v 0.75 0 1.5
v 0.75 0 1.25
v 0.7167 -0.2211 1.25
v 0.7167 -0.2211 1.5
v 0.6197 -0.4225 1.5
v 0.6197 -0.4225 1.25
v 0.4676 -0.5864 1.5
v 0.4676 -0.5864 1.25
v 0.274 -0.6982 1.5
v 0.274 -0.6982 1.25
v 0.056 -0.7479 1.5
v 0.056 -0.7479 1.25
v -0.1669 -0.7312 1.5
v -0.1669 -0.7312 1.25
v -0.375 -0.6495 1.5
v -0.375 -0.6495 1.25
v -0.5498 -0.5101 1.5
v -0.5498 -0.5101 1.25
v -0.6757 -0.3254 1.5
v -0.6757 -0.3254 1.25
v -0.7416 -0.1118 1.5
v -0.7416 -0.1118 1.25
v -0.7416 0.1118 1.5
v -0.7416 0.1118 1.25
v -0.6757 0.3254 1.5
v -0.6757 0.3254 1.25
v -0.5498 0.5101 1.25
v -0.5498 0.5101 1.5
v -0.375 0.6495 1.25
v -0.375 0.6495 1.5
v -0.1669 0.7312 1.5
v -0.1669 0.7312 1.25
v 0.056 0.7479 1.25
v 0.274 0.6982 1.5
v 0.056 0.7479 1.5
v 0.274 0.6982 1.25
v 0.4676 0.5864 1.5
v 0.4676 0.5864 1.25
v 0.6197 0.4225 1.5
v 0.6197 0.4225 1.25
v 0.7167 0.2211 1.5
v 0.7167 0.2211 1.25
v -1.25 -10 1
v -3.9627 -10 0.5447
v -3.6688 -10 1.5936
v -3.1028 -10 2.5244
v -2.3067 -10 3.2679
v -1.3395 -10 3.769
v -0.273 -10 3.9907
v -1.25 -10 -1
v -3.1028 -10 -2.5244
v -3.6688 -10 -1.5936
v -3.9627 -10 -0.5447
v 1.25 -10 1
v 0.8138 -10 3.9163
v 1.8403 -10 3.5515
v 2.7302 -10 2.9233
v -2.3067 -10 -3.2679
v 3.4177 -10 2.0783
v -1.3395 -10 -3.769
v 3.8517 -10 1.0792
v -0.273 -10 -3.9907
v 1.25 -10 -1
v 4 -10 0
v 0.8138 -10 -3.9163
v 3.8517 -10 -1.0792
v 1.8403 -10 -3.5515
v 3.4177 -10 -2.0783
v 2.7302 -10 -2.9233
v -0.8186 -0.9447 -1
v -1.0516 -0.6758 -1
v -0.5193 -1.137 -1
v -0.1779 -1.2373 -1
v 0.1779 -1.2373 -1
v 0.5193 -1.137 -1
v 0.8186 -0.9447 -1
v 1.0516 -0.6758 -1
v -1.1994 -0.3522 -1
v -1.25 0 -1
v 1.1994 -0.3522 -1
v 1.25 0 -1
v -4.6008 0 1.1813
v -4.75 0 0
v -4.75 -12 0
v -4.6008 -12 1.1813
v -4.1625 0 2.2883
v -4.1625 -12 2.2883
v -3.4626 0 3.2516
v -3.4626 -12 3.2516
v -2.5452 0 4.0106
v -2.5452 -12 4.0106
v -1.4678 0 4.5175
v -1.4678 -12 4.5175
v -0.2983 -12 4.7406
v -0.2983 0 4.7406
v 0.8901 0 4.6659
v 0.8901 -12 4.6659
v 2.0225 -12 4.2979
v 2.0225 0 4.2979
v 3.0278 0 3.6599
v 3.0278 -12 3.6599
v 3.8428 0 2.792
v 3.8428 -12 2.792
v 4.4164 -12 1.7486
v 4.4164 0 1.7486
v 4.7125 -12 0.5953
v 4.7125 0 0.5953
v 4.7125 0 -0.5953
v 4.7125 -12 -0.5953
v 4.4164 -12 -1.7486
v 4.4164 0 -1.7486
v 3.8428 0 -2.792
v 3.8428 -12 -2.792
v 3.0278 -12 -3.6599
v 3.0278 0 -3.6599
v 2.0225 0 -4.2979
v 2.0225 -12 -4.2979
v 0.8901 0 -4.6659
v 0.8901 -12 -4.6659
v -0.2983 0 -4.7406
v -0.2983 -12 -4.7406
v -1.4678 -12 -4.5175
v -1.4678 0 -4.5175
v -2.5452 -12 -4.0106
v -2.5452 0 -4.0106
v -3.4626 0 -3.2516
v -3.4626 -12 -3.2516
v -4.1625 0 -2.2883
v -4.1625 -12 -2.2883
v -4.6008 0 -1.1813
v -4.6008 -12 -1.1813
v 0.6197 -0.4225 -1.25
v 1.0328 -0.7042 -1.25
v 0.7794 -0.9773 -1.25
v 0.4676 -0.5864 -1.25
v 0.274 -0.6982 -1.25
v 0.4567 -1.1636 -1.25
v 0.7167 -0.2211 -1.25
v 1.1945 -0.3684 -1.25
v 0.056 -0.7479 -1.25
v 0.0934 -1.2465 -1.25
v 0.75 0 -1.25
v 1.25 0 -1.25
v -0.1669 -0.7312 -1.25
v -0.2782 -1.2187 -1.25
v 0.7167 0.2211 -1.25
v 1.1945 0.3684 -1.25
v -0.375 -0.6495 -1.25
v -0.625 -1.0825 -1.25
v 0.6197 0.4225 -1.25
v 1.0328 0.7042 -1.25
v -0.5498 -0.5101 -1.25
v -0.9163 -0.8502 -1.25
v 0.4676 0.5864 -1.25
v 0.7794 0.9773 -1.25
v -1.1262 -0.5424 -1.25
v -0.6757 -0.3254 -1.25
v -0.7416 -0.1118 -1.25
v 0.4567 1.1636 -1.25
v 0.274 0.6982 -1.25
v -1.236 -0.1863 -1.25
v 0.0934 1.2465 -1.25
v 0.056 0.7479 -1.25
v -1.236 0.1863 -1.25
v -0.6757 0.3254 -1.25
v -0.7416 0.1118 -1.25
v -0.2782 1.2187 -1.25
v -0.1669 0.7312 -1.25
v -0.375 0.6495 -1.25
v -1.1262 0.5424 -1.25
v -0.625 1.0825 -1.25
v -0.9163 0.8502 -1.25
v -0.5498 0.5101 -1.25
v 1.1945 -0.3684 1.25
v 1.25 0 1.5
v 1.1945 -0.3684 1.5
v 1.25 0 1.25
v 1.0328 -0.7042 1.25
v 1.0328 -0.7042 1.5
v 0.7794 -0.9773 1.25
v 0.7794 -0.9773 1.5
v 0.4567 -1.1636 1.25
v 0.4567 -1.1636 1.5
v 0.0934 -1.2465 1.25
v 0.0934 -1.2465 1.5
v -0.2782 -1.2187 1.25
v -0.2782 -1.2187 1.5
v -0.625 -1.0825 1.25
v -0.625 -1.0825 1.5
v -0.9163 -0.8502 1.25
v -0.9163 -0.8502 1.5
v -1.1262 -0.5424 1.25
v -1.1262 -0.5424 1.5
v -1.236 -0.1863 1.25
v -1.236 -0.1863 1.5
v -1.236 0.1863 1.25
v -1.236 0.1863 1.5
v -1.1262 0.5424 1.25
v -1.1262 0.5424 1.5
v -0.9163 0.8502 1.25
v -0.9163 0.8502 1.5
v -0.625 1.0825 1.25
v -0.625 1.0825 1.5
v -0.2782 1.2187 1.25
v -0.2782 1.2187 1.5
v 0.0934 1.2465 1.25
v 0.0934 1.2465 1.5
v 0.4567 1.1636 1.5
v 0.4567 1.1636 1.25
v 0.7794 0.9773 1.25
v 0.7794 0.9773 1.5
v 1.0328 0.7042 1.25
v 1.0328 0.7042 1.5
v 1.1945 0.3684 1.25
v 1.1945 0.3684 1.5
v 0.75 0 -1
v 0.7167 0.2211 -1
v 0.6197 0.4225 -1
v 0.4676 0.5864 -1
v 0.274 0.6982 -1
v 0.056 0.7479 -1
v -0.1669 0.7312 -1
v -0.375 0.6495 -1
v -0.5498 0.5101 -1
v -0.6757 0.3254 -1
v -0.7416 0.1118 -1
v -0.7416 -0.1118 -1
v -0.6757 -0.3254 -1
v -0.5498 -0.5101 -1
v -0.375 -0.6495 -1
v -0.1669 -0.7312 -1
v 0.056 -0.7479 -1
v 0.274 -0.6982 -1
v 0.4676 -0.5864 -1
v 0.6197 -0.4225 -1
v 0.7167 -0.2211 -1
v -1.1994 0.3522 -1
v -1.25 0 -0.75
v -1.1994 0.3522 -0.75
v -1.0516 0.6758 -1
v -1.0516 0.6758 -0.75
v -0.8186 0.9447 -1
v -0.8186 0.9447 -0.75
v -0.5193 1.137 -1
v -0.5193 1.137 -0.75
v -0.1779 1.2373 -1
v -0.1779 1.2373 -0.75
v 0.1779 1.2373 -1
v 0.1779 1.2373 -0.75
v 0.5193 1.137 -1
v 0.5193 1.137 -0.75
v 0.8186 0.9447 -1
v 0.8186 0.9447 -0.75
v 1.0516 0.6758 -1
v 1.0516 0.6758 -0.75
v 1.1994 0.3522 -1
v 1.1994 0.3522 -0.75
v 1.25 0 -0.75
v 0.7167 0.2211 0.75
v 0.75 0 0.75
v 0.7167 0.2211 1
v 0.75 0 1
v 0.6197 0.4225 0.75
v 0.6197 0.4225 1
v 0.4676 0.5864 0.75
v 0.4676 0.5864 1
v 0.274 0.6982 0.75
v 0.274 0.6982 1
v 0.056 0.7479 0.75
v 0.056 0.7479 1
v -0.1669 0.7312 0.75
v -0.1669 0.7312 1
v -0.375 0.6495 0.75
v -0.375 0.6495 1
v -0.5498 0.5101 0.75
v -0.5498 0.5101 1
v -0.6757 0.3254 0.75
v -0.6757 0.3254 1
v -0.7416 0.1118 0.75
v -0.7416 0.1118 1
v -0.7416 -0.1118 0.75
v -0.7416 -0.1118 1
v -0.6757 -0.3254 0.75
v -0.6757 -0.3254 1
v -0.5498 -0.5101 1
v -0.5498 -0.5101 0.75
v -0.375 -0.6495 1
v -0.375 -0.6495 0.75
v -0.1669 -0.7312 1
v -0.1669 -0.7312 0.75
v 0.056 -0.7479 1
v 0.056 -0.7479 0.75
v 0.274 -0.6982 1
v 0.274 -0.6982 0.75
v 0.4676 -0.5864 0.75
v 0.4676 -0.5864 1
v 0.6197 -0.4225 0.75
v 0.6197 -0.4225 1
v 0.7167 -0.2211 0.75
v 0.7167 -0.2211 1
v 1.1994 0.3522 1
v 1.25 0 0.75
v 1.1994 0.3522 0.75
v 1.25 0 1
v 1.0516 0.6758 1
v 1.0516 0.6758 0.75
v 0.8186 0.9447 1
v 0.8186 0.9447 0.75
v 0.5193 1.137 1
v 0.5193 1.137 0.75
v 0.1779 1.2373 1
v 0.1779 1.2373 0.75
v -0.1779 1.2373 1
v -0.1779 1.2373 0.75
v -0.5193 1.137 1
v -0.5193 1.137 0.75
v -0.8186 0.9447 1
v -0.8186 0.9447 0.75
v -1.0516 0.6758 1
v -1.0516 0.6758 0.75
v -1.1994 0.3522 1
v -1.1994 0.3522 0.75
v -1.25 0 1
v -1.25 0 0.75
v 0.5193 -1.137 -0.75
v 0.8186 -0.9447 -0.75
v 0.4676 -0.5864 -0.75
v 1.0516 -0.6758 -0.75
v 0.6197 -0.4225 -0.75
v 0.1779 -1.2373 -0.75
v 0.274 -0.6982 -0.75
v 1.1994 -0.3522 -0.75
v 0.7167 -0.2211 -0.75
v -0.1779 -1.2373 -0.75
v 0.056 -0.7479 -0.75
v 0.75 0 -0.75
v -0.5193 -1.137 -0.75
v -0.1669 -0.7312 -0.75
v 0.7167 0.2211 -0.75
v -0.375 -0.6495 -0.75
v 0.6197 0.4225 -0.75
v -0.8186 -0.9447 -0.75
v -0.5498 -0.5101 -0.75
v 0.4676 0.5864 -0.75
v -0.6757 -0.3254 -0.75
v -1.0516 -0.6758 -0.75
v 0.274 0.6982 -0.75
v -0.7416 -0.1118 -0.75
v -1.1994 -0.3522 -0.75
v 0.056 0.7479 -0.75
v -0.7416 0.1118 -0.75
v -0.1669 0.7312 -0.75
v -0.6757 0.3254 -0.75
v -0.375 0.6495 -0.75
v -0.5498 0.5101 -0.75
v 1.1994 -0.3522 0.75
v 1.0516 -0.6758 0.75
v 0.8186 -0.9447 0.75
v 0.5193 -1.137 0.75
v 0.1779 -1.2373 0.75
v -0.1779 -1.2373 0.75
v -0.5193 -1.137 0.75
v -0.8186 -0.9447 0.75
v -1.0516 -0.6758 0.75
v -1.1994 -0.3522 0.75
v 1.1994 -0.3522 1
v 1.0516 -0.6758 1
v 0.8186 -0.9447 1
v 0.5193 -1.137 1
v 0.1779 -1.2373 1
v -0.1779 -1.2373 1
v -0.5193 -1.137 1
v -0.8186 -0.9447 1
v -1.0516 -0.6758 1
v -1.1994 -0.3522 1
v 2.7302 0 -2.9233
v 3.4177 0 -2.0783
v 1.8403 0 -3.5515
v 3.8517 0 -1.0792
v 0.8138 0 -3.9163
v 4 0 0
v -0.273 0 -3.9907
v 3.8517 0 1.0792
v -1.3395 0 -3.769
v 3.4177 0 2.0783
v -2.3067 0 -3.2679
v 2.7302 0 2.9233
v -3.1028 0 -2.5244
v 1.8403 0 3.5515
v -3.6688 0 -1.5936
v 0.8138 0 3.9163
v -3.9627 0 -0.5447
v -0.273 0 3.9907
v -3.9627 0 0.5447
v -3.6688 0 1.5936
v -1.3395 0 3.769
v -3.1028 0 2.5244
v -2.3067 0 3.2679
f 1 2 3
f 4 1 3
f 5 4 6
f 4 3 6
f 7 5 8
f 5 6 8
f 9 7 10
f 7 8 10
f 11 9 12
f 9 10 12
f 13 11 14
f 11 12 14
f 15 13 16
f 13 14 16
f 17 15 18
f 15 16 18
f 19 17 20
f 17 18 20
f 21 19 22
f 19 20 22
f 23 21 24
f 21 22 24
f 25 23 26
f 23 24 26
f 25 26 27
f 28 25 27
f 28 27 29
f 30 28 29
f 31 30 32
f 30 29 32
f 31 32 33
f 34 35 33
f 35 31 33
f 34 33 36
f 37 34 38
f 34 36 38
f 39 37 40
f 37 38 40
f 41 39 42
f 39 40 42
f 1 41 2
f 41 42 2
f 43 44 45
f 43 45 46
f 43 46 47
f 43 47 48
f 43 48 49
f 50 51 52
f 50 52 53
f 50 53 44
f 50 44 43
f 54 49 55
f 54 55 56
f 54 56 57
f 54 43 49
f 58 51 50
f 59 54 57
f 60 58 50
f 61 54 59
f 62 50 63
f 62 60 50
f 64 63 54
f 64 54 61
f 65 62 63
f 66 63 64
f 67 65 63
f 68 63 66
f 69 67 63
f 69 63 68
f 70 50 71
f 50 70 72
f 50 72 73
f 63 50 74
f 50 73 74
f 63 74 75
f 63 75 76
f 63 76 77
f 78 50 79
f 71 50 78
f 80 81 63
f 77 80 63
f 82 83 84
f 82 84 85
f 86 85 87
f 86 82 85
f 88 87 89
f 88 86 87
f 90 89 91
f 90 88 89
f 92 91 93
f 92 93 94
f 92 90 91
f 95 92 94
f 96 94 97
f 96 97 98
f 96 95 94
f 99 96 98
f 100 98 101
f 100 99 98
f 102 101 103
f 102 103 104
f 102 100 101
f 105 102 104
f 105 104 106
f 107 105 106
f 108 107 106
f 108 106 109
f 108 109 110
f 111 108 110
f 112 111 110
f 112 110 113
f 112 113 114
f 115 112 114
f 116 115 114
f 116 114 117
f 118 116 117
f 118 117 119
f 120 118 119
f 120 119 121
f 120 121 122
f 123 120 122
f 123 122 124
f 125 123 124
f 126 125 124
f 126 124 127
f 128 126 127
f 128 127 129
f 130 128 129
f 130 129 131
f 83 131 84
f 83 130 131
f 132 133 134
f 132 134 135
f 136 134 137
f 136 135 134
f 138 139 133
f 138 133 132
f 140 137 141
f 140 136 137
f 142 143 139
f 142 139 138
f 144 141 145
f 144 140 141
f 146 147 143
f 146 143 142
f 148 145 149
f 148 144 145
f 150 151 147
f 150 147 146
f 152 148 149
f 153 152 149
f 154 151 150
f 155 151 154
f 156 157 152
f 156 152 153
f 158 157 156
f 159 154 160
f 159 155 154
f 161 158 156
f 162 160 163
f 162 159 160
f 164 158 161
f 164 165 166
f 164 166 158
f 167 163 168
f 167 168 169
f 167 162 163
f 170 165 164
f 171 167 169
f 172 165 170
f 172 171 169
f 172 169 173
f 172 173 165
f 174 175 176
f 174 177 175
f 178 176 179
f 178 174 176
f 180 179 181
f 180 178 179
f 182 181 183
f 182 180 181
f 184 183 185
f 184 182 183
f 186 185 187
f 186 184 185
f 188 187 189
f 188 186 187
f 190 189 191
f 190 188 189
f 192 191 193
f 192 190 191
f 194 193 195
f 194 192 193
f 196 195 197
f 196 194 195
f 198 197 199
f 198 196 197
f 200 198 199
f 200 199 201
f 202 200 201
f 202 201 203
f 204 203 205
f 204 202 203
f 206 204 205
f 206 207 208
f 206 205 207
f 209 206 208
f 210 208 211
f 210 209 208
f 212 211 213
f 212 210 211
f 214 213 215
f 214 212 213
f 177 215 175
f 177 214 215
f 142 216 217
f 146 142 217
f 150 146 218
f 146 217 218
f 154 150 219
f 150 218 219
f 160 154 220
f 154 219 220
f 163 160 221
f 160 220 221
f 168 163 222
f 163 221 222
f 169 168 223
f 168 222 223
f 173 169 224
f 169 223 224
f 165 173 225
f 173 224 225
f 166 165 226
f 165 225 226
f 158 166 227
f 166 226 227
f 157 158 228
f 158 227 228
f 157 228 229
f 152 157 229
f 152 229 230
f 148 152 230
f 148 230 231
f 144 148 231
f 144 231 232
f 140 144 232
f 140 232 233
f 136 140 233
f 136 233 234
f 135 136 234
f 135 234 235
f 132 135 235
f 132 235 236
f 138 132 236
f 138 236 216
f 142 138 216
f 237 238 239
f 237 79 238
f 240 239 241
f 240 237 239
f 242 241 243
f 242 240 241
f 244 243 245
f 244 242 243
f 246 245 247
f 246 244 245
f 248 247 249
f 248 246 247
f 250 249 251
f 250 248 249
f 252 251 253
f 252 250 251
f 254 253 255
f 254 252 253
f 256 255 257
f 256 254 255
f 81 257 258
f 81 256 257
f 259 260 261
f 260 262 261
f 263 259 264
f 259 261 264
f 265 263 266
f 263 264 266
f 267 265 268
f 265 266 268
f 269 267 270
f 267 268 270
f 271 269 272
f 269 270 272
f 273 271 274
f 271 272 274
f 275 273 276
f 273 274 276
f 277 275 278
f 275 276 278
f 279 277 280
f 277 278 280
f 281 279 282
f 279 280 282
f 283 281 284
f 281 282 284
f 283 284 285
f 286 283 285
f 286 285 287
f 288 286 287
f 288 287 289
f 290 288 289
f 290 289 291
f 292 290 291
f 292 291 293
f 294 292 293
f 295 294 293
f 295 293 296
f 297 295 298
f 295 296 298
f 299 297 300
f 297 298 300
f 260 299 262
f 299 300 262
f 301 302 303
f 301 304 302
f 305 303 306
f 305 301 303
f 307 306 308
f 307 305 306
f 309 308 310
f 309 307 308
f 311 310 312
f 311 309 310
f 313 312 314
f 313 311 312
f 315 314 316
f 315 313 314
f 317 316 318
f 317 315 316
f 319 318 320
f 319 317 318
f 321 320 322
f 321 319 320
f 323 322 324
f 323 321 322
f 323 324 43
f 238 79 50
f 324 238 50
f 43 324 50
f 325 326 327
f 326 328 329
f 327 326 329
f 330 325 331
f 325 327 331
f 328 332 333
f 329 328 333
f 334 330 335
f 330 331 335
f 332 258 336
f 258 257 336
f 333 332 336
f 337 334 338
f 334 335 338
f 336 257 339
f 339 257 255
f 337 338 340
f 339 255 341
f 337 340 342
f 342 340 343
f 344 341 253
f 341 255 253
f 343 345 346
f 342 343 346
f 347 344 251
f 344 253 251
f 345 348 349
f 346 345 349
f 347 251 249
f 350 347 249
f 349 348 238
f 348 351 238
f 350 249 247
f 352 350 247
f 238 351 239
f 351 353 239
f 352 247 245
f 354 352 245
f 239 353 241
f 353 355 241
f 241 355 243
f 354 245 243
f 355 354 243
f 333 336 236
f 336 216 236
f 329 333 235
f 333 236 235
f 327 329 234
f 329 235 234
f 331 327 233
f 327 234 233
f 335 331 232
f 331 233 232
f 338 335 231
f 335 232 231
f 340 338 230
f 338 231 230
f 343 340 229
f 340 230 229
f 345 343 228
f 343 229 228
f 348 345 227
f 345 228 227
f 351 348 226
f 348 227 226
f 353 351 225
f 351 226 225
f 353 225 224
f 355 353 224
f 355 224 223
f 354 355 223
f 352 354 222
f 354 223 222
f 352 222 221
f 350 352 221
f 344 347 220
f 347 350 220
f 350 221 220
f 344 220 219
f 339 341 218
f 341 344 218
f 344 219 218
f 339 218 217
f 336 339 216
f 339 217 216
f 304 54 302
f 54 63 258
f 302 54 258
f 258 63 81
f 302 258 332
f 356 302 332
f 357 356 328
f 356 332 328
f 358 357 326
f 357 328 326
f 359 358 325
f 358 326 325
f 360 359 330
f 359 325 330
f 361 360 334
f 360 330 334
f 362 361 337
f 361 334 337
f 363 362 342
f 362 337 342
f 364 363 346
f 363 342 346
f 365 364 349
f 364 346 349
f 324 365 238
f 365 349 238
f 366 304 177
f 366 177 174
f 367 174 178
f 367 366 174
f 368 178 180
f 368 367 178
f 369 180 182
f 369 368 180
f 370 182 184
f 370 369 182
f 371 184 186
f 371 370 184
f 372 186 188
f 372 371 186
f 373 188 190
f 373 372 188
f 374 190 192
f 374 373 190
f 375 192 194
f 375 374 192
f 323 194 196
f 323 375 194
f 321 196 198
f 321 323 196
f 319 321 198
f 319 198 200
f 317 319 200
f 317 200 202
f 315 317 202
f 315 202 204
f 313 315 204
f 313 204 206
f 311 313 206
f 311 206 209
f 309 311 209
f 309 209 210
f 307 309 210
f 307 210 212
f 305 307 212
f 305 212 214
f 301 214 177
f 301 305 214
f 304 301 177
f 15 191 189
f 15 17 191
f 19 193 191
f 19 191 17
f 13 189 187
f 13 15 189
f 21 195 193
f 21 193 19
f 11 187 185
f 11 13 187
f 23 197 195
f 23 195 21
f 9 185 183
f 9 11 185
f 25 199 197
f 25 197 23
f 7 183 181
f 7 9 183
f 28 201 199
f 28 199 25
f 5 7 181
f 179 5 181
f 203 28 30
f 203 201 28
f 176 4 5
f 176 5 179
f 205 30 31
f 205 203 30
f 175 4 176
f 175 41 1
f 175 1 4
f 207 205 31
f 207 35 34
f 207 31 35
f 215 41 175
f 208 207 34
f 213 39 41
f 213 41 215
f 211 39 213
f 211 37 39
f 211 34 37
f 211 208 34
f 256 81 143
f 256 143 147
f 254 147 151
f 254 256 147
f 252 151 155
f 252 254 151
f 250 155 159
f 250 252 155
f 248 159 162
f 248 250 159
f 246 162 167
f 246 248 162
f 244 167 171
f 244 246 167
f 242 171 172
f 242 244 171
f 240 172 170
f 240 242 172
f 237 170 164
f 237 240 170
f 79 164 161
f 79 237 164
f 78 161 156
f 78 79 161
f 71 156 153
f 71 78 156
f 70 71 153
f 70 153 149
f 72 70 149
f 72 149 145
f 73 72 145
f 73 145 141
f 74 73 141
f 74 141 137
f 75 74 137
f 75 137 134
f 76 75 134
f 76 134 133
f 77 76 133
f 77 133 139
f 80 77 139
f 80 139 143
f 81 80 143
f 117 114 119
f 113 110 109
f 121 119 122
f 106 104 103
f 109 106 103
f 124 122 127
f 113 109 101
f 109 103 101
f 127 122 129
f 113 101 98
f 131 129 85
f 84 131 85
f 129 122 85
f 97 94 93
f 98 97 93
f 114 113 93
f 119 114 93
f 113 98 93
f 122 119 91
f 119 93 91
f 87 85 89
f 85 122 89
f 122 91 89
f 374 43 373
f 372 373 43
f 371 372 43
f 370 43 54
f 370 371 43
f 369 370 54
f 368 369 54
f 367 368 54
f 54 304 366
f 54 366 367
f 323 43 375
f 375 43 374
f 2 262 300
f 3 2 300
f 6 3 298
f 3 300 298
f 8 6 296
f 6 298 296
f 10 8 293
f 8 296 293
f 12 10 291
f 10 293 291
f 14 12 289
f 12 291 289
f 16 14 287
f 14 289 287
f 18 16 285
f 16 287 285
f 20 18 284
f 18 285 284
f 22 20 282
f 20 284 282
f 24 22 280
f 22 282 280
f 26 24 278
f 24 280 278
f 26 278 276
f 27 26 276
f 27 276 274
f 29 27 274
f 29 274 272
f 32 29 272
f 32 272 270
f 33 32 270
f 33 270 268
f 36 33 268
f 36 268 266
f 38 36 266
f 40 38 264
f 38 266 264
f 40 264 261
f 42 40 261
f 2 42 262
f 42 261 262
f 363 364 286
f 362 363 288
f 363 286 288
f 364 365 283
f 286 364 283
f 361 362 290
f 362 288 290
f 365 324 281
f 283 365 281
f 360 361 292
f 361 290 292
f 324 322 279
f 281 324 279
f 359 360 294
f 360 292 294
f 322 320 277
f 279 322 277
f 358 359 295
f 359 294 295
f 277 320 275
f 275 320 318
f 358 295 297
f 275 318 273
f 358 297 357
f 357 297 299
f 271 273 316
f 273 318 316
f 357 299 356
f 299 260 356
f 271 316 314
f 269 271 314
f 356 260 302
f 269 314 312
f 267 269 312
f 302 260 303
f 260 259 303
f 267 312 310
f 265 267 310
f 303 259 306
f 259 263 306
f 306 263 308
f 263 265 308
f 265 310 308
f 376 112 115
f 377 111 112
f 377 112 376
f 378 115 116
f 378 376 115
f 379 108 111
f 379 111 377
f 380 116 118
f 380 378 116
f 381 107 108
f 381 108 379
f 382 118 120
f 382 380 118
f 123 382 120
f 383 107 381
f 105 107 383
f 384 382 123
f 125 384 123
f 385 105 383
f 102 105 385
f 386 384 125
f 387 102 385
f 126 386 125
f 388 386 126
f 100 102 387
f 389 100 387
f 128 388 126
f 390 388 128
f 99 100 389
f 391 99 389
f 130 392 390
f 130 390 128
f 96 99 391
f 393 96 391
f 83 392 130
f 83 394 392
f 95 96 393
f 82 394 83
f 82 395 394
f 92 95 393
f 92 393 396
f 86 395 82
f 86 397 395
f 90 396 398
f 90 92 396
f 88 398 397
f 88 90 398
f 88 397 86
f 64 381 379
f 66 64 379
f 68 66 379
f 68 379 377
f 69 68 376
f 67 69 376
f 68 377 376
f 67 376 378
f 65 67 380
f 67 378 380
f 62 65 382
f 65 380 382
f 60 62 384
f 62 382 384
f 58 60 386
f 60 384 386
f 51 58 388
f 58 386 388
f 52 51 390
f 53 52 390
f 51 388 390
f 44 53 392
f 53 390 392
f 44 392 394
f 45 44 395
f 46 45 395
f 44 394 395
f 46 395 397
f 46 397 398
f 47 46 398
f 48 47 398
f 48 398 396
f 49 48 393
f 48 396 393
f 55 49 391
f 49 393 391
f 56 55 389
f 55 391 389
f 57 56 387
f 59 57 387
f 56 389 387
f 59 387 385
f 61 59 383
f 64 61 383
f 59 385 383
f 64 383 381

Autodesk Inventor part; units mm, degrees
ref_plane "YZ Plane" through (0, 0, 0) normal (1, 0, 0) x (0, 1, 0)
ref_plane "XZ Plane" through (0, 0, 0) normal (0, 1, 0) x (-1, 0, 0)
ref_plane "XY Plane" through (0, 0, 0) normal (0, 0, 1) x (1, 0, 0)
sketch "Sketch1" plane through (0, 0, 0) normal (0, 1, 0) x (-1, 0, 0)
  circle A0 centre (0, 0) radius 4.75
  dimension "d0" = 9.5
extrude "Extrusion1" add sketch "Sketch1" against normal blind 12
sketch "Sketch2" plane through (0, 0, 0) normal (0, 1, 0) x (1, 0, 0)
  circle A0 centre (0, 0) radius 4
  dimension "d3" = 8
extrude "Extrusion2" cut sketch "Sketch2" against normal blind 10
sketch "Sketch3" plane through (0, 0, 0) normal (0, 0, 1) x (1, 0, 0)
  point P0 (0, 0)
sketch "Sketch4" plane through (0, 0, 0) normal (0, 0, 1) x (1, 0, 0)
  circle A0 centre (0, 0) radius 0.75
  circle A1 centre (0, 0) radius 1.25
  line L0 (-1.25, 0) -> (-1.25, -10)
  line L1 (-1.25, -10) -> (1.25, -10)
  line L2 (1.25, -10) -> (1.25, 0)
  dimension "d6" = 1.5
  dimension "d7" = 2.5
  dimension "d8" = 10
extrude "Extrusion3" add sketch "Sketch4" along normal mid plane 2 contours L2 L1 L0 A1
sketch "Sketch5" plane through (0, 0, 1) normal (0, 0, 1) x (1, 0, 0)
  circle A0 centre (0, 0) radius 0.75 projected
  circle A1 centre (0, 0) radius 1.25 projected
extrude "Extrusion4" add sketch "Sketch5" along normal mid plane 0.5
extrude "Extrusion5" add sketch "Sketch5" along normal blind 0.5
mirror "Mirror1" about plane through (0, 0, 0) normal (0, 0, 1) of "Extrusion4"
properties part number "Cylinder_1"
